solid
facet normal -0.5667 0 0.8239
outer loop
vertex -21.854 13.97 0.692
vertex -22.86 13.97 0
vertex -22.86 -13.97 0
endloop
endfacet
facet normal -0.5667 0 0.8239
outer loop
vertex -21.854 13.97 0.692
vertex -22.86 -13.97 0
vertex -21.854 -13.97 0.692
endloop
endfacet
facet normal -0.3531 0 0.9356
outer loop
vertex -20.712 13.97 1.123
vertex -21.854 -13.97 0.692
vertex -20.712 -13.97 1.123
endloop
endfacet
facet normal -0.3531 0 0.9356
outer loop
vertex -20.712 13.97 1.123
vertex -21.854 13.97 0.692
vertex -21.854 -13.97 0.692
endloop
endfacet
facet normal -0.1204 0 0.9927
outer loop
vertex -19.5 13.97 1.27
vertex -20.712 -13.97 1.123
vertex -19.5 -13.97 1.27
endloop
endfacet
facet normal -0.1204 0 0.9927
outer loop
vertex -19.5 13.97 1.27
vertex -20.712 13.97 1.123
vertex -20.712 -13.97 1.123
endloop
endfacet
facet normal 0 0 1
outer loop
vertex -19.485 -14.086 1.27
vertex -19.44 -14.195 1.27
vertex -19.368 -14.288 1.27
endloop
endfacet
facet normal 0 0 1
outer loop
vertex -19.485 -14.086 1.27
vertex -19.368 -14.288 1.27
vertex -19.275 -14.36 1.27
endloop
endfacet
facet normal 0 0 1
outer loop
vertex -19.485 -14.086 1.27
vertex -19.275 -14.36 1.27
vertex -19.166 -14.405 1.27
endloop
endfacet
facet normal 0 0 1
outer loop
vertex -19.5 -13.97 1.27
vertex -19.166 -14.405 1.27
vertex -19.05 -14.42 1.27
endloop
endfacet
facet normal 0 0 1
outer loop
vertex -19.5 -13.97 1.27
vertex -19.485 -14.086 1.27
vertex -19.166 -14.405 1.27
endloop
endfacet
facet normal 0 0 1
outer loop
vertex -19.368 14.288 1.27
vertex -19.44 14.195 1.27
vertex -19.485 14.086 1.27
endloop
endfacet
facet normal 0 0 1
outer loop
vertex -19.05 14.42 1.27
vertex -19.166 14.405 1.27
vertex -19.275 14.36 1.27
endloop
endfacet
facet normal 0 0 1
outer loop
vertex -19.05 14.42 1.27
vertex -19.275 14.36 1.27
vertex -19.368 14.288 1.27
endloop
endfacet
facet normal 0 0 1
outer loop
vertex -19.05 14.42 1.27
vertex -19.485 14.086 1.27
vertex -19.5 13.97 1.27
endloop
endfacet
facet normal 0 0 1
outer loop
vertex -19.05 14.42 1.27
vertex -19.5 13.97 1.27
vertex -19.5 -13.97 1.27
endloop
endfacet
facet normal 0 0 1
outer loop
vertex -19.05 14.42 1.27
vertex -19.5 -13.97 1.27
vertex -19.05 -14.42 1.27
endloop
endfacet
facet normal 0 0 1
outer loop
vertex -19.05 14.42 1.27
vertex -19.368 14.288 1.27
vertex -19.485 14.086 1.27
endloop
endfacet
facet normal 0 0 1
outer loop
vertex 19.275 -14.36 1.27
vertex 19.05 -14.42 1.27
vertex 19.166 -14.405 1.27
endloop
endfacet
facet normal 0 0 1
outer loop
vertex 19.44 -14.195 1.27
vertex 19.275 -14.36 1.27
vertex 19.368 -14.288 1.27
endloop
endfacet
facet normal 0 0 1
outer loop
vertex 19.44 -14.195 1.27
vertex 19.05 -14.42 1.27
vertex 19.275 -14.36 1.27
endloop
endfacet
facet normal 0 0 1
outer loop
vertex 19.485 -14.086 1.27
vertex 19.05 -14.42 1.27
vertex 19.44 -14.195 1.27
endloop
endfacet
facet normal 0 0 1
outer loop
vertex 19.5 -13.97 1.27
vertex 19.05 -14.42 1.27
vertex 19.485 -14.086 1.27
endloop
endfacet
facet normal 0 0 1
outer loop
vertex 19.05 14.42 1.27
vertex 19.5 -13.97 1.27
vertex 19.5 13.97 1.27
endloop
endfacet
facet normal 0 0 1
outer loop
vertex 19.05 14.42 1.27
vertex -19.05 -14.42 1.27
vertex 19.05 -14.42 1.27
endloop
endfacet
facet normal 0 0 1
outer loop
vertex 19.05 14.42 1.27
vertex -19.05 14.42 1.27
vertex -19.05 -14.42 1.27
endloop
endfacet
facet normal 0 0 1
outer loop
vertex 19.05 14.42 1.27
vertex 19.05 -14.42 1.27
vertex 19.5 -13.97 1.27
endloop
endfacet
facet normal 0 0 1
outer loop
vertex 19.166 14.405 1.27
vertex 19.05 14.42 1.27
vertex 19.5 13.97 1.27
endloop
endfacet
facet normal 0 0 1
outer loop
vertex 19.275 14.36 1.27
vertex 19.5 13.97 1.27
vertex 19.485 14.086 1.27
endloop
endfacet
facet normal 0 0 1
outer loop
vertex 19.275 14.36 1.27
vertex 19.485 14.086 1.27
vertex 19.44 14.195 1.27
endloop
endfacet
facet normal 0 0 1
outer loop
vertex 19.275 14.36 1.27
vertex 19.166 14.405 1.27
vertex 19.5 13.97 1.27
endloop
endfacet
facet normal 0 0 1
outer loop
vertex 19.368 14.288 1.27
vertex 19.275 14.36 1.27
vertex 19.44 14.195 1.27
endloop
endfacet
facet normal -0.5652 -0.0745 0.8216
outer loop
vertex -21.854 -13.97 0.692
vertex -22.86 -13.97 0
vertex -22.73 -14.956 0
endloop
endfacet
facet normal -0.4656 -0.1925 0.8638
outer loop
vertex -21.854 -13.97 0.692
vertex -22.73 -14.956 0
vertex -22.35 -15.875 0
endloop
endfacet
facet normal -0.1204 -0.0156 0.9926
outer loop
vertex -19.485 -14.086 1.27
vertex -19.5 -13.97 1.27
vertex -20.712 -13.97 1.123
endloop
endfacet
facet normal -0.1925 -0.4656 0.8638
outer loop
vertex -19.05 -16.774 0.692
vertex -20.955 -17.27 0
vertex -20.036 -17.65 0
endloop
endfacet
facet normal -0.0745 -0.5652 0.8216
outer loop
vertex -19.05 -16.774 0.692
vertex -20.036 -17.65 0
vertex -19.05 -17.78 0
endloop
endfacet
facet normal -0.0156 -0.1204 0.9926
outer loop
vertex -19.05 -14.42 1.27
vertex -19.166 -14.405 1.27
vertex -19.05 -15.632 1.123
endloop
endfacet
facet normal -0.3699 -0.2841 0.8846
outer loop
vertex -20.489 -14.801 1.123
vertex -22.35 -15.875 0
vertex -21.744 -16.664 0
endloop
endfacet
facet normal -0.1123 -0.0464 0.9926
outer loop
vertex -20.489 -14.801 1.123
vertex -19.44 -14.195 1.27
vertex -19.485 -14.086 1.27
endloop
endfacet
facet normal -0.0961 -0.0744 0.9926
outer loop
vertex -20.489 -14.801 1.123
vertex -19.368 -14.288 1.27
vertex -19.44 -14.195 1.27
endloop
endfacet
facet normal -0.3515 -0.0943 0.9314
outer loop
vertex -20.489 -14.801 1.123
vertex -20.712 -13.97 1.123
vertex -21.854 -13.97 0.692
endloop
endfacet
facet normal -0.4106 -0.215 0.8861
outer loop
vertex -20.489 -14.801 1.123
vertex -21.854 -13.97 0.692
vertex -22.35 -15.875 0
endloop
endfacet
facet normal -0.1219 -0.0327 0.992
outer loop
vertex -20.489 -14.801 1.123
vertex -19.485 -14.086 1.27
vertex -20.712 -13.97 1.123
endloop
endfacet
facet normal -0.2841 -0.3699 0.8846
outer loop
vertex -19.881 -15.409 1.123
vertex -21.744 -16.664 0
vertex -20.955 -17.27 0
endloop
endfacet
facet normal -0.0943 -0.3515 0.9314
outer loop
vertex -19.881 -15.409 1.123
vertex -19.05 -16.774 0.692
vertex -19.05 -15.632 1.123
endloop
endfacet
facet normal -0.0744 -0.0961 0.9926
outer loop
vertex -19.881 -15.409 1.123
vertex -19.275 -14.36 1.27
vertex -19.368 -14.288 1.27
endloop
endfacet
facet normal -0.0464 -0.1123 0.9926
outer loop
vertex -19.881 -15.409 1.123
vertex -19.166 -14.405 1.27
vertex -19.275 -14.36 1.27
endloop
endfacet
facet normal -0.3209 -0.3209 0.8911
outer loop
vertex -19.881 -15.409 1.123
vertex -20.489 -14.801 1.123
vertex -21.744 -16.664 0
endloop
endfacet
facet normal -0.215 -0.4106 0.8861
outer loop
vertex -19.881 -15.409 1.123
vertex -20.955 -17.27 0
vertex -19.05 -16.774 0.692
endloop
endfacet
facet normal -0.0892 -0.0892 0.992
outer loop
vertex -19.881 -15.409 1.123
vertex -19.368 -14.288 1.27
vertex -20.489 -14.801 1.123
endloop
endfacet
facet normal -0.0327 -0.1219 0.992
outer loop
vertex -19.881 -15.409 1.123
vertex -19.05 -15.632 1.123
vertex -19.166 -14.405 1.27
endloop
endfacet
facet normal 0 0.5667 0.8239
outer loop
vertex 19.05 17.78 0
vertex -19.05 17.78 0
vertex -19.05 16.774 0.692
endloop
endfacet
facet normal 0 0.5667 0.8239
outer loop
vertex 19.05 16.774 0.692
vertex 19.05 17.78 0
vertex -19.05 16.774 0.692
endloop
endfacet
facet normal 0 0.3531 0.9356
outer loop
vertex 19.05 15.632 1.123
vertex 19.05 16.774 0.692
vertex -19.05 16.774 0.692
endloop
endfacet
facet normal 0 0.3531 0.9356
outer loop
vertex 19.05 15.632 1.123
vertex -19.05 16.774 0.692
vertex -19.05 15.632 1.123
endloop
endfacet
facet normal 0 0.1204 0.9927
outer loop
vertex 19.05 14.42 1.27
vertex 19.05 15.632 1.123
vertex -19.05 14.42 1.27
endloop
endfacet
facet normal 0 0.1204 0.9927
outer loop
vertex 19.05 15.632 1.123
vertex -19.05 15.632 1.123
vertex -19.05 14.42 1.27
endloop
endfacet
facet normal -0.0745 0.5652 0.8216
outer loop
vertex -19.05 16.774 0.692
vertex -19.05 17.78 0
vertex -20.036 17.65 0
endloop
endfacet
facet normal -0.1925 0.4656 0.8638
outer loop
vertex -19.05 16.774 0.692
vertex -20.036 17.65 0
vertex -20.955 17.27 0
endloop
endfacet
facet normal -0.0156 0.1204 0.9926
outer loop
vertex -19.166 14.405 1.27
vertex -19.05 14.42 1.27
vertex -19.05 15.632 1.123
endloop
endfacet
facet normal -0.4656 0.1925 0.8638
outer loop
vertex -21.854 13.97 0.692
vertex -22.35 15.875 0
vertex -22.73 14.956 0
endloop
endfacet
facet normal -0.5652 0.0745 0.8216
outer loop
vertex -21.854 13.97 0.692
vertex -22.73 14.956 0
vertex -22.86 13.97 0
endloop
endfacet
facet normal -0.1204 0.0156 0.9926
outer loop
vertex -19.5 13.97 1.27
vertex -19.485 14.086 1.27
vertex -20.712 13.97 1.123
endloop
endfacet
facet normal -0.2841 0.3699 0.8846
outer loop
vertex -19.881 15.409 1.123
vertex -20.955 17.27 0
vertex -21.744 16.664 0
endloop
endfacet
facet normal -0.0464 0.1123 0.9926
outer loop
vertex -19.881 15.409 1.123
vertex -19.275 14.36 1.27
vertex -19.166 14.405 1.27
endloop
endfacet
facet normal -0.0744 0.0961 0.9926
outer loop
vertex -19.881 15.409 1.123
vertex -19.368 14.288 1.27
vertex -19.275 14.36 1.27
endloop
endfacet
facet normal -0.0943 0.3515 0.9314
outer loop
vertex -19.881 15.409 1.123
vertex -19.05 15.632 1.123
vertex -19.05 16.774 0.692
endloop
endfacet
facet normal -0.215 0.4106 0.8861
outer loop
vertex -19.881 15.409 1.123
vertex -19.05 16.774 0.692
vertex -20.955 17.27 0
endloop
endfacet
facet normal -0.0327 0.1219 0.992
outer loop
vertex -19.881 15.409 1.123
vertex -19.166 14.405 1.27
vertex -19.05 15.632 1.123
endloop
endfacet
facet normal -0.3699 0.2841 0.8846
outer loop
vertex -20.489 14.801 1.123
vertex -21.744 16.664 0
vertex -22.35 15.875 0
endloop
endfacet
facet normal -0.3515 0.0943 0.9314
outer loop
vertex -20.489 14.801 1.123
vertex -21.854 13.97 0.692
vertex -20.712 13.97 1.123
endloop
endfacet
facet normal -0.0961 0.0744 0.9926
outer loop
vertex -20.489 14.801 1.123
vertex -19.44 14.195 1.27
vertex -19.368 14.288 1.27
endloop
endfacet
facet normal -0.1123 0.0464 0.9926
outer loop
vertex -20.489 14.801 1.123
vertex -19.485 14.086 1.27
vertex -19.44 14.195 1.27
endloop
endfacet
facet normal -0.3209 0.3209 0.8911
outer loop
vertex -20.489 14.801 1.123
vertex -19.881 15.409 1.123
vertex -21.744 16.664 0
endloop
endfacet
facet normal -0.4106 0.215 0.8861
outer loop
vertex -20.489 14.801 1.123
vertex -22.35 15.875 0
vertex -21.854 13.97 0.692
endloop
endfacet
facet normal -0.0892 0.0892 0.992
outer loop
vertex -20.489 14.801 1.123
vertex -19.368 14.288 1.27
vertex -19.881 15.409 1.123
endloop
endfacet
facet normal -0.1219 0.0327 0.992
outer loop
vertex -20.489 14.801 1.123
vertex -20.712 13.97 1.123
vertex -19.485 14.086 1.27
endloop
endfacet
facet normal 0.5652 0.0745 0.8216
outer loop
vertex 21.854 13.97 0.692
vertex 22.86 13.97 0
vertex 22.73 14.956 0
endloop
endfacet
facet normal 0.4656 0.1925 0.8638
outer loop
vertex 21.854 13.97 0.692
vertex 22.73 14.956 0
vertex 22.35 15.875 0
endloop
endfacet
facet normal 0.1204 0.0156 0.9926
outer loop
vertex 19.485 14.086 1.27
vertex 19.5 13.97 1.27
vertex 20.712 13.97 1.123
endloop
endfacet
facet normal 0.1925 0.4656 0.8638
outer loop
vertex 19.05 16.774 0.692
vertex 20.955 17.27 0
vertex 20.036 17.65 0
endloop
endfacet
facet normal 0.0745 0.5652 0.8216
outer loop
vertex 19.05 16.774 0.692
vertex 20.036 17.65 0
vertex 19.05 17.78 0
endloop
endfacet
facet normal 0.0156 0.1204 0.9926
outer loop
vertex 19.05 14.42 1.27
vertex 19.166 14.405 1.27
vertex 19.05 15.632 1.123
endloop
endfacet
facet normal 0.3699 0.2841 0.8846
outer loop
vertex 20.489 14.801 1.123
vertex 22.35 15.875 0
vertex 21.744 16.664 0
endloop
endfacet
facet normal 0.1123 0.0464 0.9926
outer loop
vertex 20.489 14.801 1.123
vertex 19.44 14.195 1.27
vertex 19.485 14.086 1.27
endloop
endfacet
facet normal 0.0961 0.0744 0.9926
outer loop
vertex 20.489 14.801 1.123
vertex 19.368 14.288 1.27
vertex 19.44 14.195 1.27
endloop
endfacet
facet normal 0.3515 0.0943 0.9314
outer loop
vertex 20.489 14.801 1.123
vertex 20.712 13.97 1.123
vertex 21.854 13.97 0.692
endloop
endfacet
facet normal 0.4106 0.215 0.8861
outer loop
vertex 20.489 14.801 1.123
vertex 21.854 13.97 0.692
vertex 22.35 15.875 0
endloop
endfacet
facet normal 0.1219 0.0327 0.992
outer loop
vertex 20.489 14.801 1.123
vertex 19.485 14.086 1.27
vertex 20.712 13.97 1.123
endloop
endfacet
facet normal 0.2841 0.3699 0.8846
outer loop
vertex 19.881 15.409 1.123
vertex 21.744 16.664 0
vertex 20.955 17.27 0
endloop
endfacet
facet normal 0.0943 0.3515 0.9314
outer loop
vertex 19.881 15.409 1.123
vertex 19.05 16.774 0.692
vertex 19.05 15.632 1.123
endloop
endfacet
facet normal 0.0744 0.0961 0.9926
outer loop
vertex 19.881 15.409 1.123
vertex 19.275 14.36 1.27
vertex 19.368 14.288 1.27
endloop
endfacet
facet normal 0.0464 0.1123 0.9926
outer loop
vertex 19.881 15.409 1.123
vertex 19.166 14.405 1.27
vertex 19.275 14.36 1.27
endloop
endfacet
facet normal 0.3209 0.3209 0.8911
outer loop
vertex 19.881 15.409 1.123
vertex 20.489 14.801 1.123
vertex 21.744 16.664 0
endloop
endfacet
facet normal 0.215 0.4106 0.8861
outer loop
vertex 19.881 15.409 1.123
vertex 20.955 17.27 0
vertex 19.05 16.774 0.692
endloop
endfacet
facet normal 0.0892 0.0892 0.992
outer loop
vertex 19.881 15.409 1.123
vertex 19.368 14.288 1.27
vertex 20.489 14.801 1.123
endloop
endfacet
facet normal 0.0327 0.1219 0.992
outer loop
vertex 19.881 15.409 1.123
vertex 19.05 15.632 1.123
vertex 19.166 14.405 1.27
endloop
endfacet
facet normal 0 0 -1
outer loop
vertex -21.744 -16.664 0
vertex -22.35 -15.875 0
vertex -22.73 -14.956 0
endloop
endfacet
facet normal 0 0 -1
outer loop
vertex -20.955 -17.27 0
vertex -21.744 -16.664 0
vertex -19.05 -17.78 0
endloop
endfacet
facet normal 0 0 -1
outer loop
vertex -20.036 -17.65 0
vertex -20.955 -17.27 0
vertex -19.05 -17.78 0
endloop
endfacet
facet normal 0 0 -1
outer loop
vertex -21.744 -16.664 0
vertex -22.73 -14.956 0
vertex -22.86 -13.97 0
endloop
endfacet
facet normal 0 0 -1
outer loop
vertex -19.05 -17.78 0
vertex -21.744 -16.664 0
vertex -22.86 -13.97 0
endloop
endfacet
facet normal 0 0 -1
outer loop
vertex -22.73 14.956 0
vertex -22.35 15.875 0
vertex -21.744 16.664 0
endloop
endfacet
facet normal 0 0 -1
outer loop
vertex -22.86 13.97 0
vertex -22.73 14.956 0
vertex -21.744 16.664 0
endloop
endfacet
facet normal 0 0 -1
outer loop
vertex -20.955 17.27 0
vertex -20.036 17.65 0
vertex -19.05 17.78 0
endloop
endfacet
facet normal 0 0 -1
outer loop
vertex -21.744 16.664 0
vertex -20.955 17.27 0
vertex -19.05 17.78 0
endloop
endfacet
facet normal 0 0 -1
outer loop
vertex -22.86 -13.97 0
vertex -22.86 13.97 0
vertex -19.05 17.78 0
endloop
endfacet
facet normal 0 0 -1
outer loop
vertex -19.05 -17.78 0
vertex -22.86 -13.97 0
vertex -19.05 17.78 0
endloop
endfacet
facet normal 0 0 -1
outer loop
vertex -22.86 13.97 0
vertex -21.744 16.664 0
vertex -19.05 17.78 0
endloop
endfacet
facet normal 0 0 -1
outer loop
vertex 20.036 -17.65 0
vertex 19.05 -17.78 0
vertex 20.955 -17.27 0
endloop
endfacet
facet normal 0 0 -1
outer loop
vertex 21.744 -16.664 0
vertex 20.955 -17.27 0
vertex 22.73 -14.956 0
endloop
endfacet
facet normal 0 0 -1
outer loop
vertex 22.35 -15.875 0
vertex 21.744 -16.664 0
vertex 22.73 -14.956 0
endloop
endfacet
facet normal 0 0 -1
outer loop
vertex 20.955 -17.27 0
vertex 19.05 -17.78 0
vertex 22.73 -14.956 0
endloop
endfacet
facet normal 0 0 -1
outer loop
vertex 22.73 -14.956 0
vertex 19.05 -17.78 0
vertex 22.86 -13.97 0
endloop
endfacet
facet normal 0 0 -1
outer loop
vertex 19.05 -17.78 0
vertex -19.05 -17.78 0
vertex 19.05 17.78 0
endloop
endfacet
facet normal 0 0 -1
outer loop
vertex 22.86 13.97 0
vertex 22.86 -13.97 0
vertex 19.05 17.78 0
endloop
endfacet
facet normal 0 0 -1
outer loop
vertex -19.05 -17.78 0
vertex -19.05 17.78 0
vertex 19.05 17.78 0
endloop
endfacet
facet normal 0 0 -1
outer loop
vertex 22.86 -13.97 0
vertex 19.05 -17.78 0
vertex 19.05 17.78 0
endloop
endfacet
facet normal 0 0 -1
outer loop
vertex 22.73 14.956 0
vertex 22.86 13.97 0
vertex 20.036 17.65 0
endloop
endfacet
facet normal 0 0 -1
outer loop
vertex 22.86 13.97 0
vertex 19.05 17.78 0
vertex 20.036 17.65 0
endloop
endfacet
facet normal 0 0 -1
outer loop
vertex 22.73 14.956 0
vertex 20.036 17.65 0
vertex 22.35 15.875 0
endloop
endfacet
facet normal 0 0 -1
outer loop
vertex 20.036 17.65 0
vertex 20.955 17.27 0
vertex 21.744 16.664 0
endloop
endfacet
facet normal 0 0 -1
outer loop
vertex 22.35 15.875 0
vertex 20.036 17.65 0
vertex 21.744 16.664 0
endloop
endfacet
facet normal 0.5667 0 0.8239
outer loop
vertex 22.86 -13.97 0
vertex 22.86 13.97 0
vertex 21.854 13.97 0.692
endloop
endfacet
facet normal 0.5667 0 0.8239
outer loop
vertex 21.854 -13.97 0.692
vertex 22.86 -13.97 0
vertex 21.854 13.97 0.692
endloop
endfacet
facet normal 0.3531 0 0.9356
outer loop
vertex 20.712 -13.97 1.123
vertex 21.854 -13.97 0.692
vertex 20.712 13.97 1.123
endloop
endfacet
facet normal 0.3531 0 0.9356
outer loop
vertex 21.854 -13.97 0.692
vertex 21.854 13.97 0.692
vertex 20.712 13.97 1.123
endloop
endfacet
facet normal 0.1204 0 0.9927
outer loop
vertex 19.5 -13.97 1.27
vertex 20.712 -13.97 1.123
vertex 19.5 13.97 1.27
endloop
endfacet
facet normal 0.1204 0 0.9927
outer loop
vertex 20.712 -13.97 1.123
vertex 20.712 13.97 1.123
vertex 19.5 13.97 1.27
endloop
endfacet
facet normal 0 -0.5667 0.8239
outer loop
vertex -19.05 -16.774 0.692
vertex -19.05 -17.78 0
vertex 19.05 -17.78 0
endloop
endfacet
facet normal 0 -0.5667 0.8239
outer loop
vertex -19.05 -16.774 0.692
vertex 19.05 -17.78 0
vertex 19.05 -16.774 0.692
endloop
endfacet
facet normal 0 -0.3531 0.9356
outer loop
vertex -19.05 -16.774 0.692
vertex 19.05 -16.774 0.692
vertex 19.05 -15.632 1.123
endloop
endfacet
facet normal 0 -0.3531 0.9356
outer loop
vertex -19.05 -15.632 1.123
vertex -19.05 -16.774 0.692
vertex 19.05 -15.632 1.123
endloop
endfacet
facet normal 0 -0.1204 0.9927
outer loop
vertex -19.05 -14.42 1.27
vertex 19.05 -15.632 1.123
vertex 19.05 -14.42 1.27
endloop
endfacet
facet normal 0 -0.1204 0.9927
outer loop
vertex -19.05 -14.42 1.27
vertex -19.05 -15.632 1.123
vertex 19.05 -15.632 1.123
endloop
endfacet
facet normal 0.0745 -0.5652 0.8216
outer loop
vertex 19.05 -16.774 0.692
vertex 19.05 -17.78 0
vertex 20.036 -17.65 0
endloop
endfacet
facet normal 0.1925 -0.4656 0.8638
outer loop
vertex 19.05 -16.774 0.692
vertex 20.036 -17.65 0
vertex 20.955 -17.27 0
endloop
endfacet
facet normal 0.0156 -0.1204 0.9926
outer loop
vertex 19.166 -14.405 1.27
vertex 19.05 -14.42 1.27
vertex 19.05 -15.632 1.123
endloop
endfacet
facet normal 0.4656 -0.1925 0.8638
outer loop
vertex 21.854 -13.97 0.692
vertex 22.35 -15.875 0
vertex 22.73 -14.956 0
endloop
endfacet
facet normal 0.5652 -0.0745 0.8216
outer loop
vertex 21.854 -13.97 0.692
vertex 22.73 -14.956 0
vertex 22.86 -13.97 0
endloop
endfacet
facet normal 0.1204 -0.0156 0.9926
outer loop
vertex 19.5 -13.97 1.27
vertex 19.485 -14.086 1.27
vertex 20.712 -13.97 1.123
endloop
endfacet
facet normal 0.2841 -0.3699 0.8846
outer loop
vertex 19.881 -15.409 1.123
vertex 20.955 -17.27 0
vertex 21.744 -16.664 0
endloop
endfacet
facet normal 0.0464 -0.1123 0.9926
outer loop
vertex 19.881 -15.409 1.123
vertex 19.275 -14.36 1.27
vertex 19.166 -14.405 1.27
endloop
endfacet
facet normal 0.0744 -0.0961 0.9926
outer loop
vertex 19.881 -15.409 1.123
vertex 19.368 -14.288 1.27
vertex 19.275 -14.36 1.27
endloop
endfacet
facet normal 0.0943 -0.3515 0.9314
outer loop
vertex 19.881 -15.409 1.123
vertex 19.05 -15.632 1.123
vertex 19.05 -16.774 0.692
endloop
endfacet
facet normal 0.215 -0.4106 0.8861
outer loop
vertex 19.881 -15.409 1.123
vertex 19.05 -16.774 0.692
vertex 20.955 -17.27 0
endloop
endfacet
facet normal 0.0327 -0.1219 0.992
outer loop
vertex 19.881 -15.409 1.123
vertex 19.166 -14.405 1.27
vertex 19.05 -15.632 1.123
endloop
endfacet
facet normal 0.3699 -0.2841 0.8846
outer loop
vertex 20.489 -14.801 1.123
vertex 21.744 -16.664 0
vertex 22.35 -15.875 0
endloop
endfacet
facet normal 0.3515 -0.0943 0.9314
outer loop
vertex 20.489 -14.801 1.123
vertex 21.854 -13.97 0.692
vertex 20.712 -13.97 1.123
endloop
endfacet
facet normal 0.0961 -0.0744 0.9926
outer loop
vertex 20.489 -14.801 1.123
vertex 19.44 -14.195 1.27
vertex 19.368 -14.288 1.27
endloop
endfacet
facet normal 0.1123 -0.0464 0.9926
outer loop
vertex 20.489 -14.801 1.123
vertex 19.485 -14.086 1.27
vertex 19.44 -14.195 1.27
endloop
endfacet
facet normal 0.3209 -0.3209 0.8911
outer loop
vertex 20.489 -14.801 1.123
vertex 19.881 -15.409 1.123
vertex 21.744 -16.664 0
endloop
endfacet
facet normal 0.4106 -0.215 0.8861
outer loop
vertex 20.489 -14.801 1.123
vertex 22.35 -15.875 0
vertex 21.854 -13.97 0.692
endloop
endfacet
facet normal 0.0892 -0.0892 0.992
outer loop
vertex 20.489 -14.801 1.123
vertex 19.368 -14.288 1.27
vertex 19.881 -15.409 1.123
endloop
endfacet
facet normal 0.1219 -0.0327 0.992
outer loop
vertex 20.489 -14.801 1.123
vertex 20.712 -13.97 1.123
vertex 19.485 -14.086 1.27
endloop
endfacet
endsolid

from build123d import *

# Parameters (mm, degrees)
F1_DEPTH     = 1.27
F2_T1_DEPTH  = 27.94
F2_T3_DEPTH  = 38.1
F2_T6_ANGLE  = 90
F2_T8_ANGLE  = 90
F2_T10_ANGLE = 90
F2_T12_ANGLE = 90


# Not quite as in the source:
# - a fillet or chamfer that OpenCascade refuses, or shapes differently, is made with other operations: its cross-section is extruded or revolved along the edge and cut away or added


with BuildPart() as f1:
    # F0 (on Top) → F1 (new body)
    with BuildSketch(Plane.XY):
        with BuildLine():
            ThreePointArc((22.86, 13.97), (21.7440768363, 16.6640768363), (19.05, 17.78))
            Line((19.05, 17.78), (-19.05, 17.78))
            ThreePointArc((-19.05, 17.78), (-21.7440768363, 16.6640768363), (-22.86, 13.97))
            Line((-22.86, 13.97), (-22.86, -13.97))
            ThreePointArc((-22.86, -13.97), (-21.7440768363, -16.6640768363), (-19.05, -17.78))
            Line((-19.05, -17.78), (19.05, -17.78))
            ThreePointArc((19.05, -17.78), (21.7440768363, -16.6640768363), (22.86, -13.97))
            Line((22.86, -13.97), (22.86, 13.97))
        make_face()
    extrude(amount=F1_DEPTH)

    # F2: fillet of radius 5.08 on 1 edges, made by hand

    # F2_s2 → F2_t1 (cut)
    with BuildSketch(Plane.XZ.offset(-13.97)):
        with BuildLine():
            ThreePointArc((-22.86, 0), (-21.2959470592, 0.9419048812), (-19.4998958349, 1.27))
            Line((-19.4998958349, 1.27), (-22.86, 1.27))
            Line((-22.86, 1.27), (-22.86, 0))
        make_face()
        with BuildLine():
            ThreePointArc((22.86, 0), (21.2959470592, 0.9419048812), (19.4998958349, 1.27))
            Line((19.4998958349, 1.27), (22.86, 1.27))
            Line((22.86, 1.27), (22.86, 0))
        make_face()
    extrude(amount=F2_T1_DEPTH, mode=Mode.SUBTRACT)

    # F2_s4 → F2_t3 (cut)
    with BuildSketch(Plane.YZ.offset(-19.05)):
        with BuildLine():
            ThreePointArc((-17.78, 0), (-16.2159470592, 0.9419048812), (-14.4198958349, 1.27))
            Line((-14.4198958349, 1.27), (-17.78, 1.27))
            Line((-17.78, 1.27), (-17.78, 0))
        make_face()
        with BuildLine():
            ThreePointArc((17.78, 0), (16.2159470592, 0.9419048812), (14.4198958349, 1.27))
            Line((14.4198958349, 1.27), (17.78, 1.27))
            Line((17.78, 1.27), (17.78, 0))
        make_face()
    extrude(amount=F2_T3_DEPTH, mode=Mode.SUBTRACT)

    # F2_s5 → F2_t6 (revolve, cut)
    with BuildSketch(Plane.YZ.offset(-19.05)):
        with BuildLine():
            ThreePointArc((17.78, 0), (16.2159470592, 0.9419048812), (14.4198958349, 1.27))
            Line((14.4198958349, 1.27), (17.78, 1.27))
            Line((17.78, 1.27), (17.78, 0))
        make_face()
    revolve(axis=Axis((-19.05, 13.97, 1.27), (0, 0, 1)), revolution_arc=F2_T6_ANGLE, mode=Mode.SUBTRACT)

    # F2_s7 → F2_t8 (revolve, cut)
    with BuildSketch(Plane.XZ.offset(13.97)):
        with BuildLine():
            ThreePointArc((-22.86, 0), (-21.2959470592, 0.9419048812), (-19.4998958349, 1.27))
            Line((-19.4998958349, 1.27), (-22.86, 1.27))
            Line((-22.86, 1.27), (-22.86, 0))
        make_face()
    revolve(axis=Axis((-19.05, -13.97, 1.27), (0, 0, 1)), revolution_arc=F2_T8_ANGLE, mode=Mode.SUBTRACT)

    # F2_s9 → F2_t10 (revolve, cut)
    with BuildSketch(Plane.YZ.offset(19.05)):
        with BuildLine():
            ThreePointArc((-17.78, 0), (-16.2159470592, 0.9419048812), (-14.4198958349, 1.27))
            Line((-14.4198958349, 1.27), (-17.78, 1.27))
            Line((-17.78, 1.27), (-17.78, 0))
        make_face()
    revolve(axis=Axis((19.05, -13.97, 1.27), (0, 0, 1)), revolution_arc=F2_T10_ANGLE, mode=Mode.SUBTRACT)

    # F2_s11 → F2_t12 (revolve, cut)
    with BuildSketch(Plane.XZ.offset(-13.97)):
        with BuildLine():
            ThreePointArc((22.86, 0), (21.2959470592, 0.9419048812), (19.4998958349, 1.27))
            Line((19.4998958349, 1.27), (22.86, 1.27))
            Line((22.86, 1.27), (22.86, 0))
        make_face()
    revolve(axis=Axis((19.05, 13.97, 1.27), (0, 0, 1)), revolution_arc=F2_T12_ANGLE, mode=Mode.SUBTRACT)


solid = f1.part
